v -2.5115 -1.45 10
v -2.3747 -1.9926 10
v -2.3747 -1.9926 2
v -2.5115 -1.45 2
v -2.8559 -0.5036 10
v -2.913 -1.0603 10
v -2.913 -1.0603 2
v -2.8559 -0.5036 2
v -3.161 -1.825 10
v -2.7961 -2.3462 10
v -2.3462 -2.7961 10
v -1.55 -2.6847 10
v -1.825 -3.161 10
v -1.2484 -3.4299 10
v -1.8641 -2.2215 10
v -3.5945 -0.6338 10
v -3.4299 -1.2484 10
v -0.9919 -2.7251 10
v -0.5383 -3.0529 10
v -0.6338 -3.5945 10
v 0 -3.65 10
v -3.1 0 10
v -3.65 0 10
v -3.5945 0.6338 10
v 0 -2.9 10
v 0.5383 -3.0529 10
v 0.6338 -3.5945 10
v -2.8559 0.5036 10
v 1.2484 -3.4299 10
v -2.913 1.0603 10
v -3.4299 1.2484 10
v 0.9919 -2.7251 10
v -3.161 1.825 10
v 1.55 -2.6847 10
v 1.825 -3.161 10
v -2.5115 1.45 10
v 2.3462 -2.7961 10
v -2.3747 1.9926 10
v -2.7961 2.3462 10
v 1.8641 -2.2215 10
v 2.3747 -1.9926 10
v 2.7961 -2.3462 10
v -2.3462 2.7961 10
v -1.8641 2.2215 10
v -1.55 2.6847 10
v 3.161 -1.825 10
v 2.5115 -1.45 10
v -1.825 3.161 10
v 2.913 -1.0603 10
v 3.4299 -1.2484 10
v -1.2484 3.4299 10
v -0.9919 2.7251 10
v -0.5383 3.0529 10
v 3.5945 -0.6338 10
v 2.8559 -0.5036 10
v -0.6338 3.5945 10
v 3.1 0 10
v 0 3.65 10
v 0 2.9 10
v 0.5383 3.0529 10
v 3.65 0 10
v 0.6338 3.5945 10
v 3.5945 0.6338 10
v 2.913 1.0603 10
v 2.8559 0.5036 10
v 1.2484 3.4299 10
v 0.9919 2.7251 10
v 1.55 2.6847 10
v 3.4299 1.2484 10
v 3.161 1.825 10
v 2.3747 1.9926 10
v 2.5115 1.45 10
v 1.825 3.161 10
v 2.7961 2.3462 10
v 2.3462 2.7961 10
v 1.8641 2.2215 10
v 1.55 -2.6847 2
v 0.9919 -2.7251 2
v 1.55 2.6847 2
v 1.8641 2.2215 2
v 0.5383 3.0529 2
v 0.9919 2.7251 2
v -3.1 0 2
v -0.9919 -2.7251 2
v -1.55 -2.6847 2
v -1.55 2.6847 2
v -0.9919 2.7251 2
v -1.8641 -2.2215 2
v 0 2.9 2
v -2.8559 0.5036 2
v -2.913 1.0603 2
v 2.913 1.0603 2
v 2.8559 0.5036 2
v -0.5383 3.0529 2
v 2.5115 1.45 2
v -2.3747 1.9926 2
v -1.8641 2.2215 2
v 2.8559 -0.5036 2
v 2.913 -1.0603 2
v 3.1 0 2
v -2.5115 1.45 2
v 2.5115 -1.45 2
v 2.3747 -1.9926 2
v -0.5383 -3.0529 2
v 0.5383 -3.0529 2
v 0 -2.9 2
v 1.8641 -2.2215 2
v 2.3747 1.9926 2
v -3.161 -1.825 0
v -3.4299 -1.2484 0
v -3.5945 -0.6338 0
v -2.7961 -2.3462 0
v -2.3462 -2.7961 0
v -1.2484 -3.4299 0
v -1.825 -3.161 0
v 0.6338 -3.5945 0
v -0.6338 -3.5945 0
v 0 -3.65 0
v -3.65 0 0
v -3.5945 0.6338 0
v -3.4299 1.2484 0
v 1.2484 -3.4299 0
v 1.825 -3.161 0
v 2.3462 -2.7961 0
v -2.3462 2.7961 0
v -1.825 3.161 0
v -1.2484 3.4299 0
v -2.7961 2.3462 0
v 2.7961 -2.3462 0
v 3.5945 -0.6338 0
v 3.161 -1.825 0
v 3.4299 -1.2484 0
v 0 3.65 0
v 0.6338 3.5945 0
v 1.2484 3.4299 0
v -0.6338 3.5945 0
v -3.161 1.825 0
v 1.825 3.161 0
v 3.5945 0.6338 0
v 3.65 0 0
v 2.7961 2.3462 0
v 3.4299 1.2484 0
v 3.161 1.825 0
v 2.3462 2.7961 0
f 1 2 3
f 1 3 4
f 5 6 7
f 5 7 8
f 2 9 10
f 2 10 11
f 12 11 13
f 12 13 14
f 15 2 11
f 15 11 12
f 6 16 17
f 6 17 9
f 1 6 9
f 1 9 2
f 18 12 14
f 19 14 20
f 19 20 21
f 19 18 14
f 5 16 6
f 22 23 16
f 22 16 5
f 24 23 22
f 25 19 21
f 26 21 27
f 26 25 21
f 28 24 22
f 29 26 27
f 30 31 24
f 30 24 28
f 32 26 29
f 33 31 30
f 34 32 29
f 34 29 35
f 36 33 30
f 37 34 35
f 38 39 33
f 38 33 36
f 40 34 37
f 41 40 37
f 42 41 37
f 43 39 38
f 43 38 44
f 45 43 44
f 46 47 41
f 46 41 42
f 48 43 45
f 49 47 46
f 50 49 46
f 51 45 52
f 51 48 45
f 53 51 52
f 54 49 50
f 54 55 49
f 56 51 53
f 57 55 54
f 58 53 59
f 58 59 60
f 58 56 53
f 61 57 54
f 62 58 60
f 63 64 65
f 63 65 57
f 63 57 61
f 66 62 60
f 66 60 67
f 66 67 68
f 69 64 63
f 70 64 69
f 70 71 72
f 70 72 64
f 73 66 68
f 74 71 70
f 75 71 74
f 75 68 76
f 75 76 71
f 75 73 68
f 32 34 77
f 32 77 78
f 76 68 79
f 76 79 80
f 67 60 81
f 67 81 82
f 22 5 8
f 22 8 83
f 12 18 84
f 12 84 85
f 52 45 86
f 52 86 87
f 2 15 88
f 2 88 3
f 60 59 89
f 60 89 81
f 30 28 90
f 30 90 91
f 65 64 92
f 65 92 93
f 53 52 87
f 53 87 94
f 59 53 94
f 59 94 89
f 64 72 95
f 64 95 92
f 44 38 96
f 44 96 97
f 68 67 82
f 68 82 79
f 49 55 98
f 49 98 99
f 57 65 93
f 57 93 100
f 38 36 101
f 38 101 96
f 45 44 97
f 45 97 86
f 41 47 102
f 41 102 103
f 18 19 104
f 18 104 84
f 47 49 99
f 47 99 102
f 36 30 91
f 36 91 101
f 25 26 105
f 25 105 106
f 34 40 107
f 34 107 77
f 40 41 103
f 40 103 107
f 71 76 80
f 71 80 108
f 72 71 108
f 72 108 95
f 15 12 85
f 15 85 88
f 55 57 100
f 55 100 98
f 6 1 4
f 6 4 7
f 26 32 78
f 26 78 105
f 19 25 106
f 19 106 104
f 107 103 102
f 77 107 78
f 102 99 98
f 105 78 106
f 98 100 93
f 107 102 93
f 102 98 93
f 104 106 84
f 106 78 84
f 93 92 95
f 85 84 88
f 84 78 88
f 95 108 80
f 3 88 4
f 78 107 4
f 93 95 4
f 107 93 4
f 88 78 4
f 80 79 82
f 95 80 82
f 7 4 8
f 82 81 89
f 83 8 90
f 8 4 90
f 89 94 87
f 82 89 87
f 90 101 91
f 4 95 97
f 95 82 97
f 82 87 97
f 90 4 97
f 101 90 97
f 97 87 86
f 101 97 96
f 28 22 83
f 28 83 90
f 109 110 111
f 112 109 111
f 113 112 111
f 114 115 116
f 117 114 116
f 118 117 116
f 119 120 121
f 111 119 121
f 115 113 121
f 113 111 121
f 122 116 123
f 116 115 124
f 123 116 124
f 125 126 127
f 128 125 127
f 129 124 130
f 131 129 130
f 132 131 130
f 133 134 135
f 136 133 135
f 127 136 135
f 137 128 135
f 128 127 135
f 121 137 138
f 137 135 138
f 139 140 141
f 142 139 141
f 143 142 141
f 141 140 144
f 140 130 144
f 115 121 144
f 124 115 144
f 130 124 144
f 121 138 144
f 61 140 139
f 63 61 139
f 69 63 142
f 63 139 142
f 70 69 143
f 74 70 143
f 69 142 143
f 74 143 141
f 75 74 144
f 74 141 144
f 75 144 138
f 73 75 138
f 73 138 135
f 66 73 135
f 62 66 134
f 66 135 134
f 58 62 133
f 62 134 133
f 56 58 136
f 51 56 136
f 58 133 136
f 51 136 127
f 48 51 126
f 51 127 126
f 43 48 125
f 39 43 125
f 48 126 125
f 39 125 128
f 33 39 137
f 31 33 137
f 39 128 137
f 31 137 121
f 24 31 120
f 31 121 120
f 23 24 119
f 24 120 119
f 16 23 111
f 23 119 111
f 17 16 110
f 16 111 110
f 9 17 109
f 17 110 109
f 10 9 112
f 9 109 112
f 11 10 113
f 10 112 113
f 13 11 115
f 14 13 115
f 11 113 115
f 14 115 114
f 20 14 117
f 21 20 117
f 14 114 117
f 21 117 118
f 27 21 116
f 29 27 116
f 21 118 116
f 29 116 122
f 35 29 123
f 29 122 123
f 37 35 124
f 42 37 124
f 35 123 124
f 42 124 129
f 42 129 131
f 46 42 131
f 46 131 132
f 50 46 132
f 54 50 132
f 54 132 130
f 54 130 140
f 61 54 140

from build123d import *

# Parameters (mm, degrees)
SKETCH_R           = 3.65
PAD_DEPTH          = 10
POCKET_DEPTH       = 8
POLARPATTERN_COUNT = 18


with BuildPart() as part:
    # Sketch → Pad (new body)
    with BuildSketch(Plane.XY):
        Circle(SKETCH_R)
    extrude(amount=PAD_DEPTH)

    # Sketch001 (on Face3 of Pad) → Pocket (cut)
    with BuildSketch(Plane.XY.offset(10)):
        Polygon((-2.9130471244, 1.0602624443), (0, 0), (-3.1, 0), (-2.8559424837, 0.5035797152), align=None)
    pocket = extrude(amount=-POCKET_DEPTH, mode=Mode.SUBTRACT)

    # PolarPattern: Pocket ×18 about axis
    polarpattern_axis = Axis((0, 0, 10), (0, 0, 1))
    for i in range(1, POLARPATTERN_COUNT):
        add(pocket.rotate(polarpattern_axis, i * 360 / POLARPATTERN_COUNT), mode=Mode.SUBTRACT)


solid = part.part
